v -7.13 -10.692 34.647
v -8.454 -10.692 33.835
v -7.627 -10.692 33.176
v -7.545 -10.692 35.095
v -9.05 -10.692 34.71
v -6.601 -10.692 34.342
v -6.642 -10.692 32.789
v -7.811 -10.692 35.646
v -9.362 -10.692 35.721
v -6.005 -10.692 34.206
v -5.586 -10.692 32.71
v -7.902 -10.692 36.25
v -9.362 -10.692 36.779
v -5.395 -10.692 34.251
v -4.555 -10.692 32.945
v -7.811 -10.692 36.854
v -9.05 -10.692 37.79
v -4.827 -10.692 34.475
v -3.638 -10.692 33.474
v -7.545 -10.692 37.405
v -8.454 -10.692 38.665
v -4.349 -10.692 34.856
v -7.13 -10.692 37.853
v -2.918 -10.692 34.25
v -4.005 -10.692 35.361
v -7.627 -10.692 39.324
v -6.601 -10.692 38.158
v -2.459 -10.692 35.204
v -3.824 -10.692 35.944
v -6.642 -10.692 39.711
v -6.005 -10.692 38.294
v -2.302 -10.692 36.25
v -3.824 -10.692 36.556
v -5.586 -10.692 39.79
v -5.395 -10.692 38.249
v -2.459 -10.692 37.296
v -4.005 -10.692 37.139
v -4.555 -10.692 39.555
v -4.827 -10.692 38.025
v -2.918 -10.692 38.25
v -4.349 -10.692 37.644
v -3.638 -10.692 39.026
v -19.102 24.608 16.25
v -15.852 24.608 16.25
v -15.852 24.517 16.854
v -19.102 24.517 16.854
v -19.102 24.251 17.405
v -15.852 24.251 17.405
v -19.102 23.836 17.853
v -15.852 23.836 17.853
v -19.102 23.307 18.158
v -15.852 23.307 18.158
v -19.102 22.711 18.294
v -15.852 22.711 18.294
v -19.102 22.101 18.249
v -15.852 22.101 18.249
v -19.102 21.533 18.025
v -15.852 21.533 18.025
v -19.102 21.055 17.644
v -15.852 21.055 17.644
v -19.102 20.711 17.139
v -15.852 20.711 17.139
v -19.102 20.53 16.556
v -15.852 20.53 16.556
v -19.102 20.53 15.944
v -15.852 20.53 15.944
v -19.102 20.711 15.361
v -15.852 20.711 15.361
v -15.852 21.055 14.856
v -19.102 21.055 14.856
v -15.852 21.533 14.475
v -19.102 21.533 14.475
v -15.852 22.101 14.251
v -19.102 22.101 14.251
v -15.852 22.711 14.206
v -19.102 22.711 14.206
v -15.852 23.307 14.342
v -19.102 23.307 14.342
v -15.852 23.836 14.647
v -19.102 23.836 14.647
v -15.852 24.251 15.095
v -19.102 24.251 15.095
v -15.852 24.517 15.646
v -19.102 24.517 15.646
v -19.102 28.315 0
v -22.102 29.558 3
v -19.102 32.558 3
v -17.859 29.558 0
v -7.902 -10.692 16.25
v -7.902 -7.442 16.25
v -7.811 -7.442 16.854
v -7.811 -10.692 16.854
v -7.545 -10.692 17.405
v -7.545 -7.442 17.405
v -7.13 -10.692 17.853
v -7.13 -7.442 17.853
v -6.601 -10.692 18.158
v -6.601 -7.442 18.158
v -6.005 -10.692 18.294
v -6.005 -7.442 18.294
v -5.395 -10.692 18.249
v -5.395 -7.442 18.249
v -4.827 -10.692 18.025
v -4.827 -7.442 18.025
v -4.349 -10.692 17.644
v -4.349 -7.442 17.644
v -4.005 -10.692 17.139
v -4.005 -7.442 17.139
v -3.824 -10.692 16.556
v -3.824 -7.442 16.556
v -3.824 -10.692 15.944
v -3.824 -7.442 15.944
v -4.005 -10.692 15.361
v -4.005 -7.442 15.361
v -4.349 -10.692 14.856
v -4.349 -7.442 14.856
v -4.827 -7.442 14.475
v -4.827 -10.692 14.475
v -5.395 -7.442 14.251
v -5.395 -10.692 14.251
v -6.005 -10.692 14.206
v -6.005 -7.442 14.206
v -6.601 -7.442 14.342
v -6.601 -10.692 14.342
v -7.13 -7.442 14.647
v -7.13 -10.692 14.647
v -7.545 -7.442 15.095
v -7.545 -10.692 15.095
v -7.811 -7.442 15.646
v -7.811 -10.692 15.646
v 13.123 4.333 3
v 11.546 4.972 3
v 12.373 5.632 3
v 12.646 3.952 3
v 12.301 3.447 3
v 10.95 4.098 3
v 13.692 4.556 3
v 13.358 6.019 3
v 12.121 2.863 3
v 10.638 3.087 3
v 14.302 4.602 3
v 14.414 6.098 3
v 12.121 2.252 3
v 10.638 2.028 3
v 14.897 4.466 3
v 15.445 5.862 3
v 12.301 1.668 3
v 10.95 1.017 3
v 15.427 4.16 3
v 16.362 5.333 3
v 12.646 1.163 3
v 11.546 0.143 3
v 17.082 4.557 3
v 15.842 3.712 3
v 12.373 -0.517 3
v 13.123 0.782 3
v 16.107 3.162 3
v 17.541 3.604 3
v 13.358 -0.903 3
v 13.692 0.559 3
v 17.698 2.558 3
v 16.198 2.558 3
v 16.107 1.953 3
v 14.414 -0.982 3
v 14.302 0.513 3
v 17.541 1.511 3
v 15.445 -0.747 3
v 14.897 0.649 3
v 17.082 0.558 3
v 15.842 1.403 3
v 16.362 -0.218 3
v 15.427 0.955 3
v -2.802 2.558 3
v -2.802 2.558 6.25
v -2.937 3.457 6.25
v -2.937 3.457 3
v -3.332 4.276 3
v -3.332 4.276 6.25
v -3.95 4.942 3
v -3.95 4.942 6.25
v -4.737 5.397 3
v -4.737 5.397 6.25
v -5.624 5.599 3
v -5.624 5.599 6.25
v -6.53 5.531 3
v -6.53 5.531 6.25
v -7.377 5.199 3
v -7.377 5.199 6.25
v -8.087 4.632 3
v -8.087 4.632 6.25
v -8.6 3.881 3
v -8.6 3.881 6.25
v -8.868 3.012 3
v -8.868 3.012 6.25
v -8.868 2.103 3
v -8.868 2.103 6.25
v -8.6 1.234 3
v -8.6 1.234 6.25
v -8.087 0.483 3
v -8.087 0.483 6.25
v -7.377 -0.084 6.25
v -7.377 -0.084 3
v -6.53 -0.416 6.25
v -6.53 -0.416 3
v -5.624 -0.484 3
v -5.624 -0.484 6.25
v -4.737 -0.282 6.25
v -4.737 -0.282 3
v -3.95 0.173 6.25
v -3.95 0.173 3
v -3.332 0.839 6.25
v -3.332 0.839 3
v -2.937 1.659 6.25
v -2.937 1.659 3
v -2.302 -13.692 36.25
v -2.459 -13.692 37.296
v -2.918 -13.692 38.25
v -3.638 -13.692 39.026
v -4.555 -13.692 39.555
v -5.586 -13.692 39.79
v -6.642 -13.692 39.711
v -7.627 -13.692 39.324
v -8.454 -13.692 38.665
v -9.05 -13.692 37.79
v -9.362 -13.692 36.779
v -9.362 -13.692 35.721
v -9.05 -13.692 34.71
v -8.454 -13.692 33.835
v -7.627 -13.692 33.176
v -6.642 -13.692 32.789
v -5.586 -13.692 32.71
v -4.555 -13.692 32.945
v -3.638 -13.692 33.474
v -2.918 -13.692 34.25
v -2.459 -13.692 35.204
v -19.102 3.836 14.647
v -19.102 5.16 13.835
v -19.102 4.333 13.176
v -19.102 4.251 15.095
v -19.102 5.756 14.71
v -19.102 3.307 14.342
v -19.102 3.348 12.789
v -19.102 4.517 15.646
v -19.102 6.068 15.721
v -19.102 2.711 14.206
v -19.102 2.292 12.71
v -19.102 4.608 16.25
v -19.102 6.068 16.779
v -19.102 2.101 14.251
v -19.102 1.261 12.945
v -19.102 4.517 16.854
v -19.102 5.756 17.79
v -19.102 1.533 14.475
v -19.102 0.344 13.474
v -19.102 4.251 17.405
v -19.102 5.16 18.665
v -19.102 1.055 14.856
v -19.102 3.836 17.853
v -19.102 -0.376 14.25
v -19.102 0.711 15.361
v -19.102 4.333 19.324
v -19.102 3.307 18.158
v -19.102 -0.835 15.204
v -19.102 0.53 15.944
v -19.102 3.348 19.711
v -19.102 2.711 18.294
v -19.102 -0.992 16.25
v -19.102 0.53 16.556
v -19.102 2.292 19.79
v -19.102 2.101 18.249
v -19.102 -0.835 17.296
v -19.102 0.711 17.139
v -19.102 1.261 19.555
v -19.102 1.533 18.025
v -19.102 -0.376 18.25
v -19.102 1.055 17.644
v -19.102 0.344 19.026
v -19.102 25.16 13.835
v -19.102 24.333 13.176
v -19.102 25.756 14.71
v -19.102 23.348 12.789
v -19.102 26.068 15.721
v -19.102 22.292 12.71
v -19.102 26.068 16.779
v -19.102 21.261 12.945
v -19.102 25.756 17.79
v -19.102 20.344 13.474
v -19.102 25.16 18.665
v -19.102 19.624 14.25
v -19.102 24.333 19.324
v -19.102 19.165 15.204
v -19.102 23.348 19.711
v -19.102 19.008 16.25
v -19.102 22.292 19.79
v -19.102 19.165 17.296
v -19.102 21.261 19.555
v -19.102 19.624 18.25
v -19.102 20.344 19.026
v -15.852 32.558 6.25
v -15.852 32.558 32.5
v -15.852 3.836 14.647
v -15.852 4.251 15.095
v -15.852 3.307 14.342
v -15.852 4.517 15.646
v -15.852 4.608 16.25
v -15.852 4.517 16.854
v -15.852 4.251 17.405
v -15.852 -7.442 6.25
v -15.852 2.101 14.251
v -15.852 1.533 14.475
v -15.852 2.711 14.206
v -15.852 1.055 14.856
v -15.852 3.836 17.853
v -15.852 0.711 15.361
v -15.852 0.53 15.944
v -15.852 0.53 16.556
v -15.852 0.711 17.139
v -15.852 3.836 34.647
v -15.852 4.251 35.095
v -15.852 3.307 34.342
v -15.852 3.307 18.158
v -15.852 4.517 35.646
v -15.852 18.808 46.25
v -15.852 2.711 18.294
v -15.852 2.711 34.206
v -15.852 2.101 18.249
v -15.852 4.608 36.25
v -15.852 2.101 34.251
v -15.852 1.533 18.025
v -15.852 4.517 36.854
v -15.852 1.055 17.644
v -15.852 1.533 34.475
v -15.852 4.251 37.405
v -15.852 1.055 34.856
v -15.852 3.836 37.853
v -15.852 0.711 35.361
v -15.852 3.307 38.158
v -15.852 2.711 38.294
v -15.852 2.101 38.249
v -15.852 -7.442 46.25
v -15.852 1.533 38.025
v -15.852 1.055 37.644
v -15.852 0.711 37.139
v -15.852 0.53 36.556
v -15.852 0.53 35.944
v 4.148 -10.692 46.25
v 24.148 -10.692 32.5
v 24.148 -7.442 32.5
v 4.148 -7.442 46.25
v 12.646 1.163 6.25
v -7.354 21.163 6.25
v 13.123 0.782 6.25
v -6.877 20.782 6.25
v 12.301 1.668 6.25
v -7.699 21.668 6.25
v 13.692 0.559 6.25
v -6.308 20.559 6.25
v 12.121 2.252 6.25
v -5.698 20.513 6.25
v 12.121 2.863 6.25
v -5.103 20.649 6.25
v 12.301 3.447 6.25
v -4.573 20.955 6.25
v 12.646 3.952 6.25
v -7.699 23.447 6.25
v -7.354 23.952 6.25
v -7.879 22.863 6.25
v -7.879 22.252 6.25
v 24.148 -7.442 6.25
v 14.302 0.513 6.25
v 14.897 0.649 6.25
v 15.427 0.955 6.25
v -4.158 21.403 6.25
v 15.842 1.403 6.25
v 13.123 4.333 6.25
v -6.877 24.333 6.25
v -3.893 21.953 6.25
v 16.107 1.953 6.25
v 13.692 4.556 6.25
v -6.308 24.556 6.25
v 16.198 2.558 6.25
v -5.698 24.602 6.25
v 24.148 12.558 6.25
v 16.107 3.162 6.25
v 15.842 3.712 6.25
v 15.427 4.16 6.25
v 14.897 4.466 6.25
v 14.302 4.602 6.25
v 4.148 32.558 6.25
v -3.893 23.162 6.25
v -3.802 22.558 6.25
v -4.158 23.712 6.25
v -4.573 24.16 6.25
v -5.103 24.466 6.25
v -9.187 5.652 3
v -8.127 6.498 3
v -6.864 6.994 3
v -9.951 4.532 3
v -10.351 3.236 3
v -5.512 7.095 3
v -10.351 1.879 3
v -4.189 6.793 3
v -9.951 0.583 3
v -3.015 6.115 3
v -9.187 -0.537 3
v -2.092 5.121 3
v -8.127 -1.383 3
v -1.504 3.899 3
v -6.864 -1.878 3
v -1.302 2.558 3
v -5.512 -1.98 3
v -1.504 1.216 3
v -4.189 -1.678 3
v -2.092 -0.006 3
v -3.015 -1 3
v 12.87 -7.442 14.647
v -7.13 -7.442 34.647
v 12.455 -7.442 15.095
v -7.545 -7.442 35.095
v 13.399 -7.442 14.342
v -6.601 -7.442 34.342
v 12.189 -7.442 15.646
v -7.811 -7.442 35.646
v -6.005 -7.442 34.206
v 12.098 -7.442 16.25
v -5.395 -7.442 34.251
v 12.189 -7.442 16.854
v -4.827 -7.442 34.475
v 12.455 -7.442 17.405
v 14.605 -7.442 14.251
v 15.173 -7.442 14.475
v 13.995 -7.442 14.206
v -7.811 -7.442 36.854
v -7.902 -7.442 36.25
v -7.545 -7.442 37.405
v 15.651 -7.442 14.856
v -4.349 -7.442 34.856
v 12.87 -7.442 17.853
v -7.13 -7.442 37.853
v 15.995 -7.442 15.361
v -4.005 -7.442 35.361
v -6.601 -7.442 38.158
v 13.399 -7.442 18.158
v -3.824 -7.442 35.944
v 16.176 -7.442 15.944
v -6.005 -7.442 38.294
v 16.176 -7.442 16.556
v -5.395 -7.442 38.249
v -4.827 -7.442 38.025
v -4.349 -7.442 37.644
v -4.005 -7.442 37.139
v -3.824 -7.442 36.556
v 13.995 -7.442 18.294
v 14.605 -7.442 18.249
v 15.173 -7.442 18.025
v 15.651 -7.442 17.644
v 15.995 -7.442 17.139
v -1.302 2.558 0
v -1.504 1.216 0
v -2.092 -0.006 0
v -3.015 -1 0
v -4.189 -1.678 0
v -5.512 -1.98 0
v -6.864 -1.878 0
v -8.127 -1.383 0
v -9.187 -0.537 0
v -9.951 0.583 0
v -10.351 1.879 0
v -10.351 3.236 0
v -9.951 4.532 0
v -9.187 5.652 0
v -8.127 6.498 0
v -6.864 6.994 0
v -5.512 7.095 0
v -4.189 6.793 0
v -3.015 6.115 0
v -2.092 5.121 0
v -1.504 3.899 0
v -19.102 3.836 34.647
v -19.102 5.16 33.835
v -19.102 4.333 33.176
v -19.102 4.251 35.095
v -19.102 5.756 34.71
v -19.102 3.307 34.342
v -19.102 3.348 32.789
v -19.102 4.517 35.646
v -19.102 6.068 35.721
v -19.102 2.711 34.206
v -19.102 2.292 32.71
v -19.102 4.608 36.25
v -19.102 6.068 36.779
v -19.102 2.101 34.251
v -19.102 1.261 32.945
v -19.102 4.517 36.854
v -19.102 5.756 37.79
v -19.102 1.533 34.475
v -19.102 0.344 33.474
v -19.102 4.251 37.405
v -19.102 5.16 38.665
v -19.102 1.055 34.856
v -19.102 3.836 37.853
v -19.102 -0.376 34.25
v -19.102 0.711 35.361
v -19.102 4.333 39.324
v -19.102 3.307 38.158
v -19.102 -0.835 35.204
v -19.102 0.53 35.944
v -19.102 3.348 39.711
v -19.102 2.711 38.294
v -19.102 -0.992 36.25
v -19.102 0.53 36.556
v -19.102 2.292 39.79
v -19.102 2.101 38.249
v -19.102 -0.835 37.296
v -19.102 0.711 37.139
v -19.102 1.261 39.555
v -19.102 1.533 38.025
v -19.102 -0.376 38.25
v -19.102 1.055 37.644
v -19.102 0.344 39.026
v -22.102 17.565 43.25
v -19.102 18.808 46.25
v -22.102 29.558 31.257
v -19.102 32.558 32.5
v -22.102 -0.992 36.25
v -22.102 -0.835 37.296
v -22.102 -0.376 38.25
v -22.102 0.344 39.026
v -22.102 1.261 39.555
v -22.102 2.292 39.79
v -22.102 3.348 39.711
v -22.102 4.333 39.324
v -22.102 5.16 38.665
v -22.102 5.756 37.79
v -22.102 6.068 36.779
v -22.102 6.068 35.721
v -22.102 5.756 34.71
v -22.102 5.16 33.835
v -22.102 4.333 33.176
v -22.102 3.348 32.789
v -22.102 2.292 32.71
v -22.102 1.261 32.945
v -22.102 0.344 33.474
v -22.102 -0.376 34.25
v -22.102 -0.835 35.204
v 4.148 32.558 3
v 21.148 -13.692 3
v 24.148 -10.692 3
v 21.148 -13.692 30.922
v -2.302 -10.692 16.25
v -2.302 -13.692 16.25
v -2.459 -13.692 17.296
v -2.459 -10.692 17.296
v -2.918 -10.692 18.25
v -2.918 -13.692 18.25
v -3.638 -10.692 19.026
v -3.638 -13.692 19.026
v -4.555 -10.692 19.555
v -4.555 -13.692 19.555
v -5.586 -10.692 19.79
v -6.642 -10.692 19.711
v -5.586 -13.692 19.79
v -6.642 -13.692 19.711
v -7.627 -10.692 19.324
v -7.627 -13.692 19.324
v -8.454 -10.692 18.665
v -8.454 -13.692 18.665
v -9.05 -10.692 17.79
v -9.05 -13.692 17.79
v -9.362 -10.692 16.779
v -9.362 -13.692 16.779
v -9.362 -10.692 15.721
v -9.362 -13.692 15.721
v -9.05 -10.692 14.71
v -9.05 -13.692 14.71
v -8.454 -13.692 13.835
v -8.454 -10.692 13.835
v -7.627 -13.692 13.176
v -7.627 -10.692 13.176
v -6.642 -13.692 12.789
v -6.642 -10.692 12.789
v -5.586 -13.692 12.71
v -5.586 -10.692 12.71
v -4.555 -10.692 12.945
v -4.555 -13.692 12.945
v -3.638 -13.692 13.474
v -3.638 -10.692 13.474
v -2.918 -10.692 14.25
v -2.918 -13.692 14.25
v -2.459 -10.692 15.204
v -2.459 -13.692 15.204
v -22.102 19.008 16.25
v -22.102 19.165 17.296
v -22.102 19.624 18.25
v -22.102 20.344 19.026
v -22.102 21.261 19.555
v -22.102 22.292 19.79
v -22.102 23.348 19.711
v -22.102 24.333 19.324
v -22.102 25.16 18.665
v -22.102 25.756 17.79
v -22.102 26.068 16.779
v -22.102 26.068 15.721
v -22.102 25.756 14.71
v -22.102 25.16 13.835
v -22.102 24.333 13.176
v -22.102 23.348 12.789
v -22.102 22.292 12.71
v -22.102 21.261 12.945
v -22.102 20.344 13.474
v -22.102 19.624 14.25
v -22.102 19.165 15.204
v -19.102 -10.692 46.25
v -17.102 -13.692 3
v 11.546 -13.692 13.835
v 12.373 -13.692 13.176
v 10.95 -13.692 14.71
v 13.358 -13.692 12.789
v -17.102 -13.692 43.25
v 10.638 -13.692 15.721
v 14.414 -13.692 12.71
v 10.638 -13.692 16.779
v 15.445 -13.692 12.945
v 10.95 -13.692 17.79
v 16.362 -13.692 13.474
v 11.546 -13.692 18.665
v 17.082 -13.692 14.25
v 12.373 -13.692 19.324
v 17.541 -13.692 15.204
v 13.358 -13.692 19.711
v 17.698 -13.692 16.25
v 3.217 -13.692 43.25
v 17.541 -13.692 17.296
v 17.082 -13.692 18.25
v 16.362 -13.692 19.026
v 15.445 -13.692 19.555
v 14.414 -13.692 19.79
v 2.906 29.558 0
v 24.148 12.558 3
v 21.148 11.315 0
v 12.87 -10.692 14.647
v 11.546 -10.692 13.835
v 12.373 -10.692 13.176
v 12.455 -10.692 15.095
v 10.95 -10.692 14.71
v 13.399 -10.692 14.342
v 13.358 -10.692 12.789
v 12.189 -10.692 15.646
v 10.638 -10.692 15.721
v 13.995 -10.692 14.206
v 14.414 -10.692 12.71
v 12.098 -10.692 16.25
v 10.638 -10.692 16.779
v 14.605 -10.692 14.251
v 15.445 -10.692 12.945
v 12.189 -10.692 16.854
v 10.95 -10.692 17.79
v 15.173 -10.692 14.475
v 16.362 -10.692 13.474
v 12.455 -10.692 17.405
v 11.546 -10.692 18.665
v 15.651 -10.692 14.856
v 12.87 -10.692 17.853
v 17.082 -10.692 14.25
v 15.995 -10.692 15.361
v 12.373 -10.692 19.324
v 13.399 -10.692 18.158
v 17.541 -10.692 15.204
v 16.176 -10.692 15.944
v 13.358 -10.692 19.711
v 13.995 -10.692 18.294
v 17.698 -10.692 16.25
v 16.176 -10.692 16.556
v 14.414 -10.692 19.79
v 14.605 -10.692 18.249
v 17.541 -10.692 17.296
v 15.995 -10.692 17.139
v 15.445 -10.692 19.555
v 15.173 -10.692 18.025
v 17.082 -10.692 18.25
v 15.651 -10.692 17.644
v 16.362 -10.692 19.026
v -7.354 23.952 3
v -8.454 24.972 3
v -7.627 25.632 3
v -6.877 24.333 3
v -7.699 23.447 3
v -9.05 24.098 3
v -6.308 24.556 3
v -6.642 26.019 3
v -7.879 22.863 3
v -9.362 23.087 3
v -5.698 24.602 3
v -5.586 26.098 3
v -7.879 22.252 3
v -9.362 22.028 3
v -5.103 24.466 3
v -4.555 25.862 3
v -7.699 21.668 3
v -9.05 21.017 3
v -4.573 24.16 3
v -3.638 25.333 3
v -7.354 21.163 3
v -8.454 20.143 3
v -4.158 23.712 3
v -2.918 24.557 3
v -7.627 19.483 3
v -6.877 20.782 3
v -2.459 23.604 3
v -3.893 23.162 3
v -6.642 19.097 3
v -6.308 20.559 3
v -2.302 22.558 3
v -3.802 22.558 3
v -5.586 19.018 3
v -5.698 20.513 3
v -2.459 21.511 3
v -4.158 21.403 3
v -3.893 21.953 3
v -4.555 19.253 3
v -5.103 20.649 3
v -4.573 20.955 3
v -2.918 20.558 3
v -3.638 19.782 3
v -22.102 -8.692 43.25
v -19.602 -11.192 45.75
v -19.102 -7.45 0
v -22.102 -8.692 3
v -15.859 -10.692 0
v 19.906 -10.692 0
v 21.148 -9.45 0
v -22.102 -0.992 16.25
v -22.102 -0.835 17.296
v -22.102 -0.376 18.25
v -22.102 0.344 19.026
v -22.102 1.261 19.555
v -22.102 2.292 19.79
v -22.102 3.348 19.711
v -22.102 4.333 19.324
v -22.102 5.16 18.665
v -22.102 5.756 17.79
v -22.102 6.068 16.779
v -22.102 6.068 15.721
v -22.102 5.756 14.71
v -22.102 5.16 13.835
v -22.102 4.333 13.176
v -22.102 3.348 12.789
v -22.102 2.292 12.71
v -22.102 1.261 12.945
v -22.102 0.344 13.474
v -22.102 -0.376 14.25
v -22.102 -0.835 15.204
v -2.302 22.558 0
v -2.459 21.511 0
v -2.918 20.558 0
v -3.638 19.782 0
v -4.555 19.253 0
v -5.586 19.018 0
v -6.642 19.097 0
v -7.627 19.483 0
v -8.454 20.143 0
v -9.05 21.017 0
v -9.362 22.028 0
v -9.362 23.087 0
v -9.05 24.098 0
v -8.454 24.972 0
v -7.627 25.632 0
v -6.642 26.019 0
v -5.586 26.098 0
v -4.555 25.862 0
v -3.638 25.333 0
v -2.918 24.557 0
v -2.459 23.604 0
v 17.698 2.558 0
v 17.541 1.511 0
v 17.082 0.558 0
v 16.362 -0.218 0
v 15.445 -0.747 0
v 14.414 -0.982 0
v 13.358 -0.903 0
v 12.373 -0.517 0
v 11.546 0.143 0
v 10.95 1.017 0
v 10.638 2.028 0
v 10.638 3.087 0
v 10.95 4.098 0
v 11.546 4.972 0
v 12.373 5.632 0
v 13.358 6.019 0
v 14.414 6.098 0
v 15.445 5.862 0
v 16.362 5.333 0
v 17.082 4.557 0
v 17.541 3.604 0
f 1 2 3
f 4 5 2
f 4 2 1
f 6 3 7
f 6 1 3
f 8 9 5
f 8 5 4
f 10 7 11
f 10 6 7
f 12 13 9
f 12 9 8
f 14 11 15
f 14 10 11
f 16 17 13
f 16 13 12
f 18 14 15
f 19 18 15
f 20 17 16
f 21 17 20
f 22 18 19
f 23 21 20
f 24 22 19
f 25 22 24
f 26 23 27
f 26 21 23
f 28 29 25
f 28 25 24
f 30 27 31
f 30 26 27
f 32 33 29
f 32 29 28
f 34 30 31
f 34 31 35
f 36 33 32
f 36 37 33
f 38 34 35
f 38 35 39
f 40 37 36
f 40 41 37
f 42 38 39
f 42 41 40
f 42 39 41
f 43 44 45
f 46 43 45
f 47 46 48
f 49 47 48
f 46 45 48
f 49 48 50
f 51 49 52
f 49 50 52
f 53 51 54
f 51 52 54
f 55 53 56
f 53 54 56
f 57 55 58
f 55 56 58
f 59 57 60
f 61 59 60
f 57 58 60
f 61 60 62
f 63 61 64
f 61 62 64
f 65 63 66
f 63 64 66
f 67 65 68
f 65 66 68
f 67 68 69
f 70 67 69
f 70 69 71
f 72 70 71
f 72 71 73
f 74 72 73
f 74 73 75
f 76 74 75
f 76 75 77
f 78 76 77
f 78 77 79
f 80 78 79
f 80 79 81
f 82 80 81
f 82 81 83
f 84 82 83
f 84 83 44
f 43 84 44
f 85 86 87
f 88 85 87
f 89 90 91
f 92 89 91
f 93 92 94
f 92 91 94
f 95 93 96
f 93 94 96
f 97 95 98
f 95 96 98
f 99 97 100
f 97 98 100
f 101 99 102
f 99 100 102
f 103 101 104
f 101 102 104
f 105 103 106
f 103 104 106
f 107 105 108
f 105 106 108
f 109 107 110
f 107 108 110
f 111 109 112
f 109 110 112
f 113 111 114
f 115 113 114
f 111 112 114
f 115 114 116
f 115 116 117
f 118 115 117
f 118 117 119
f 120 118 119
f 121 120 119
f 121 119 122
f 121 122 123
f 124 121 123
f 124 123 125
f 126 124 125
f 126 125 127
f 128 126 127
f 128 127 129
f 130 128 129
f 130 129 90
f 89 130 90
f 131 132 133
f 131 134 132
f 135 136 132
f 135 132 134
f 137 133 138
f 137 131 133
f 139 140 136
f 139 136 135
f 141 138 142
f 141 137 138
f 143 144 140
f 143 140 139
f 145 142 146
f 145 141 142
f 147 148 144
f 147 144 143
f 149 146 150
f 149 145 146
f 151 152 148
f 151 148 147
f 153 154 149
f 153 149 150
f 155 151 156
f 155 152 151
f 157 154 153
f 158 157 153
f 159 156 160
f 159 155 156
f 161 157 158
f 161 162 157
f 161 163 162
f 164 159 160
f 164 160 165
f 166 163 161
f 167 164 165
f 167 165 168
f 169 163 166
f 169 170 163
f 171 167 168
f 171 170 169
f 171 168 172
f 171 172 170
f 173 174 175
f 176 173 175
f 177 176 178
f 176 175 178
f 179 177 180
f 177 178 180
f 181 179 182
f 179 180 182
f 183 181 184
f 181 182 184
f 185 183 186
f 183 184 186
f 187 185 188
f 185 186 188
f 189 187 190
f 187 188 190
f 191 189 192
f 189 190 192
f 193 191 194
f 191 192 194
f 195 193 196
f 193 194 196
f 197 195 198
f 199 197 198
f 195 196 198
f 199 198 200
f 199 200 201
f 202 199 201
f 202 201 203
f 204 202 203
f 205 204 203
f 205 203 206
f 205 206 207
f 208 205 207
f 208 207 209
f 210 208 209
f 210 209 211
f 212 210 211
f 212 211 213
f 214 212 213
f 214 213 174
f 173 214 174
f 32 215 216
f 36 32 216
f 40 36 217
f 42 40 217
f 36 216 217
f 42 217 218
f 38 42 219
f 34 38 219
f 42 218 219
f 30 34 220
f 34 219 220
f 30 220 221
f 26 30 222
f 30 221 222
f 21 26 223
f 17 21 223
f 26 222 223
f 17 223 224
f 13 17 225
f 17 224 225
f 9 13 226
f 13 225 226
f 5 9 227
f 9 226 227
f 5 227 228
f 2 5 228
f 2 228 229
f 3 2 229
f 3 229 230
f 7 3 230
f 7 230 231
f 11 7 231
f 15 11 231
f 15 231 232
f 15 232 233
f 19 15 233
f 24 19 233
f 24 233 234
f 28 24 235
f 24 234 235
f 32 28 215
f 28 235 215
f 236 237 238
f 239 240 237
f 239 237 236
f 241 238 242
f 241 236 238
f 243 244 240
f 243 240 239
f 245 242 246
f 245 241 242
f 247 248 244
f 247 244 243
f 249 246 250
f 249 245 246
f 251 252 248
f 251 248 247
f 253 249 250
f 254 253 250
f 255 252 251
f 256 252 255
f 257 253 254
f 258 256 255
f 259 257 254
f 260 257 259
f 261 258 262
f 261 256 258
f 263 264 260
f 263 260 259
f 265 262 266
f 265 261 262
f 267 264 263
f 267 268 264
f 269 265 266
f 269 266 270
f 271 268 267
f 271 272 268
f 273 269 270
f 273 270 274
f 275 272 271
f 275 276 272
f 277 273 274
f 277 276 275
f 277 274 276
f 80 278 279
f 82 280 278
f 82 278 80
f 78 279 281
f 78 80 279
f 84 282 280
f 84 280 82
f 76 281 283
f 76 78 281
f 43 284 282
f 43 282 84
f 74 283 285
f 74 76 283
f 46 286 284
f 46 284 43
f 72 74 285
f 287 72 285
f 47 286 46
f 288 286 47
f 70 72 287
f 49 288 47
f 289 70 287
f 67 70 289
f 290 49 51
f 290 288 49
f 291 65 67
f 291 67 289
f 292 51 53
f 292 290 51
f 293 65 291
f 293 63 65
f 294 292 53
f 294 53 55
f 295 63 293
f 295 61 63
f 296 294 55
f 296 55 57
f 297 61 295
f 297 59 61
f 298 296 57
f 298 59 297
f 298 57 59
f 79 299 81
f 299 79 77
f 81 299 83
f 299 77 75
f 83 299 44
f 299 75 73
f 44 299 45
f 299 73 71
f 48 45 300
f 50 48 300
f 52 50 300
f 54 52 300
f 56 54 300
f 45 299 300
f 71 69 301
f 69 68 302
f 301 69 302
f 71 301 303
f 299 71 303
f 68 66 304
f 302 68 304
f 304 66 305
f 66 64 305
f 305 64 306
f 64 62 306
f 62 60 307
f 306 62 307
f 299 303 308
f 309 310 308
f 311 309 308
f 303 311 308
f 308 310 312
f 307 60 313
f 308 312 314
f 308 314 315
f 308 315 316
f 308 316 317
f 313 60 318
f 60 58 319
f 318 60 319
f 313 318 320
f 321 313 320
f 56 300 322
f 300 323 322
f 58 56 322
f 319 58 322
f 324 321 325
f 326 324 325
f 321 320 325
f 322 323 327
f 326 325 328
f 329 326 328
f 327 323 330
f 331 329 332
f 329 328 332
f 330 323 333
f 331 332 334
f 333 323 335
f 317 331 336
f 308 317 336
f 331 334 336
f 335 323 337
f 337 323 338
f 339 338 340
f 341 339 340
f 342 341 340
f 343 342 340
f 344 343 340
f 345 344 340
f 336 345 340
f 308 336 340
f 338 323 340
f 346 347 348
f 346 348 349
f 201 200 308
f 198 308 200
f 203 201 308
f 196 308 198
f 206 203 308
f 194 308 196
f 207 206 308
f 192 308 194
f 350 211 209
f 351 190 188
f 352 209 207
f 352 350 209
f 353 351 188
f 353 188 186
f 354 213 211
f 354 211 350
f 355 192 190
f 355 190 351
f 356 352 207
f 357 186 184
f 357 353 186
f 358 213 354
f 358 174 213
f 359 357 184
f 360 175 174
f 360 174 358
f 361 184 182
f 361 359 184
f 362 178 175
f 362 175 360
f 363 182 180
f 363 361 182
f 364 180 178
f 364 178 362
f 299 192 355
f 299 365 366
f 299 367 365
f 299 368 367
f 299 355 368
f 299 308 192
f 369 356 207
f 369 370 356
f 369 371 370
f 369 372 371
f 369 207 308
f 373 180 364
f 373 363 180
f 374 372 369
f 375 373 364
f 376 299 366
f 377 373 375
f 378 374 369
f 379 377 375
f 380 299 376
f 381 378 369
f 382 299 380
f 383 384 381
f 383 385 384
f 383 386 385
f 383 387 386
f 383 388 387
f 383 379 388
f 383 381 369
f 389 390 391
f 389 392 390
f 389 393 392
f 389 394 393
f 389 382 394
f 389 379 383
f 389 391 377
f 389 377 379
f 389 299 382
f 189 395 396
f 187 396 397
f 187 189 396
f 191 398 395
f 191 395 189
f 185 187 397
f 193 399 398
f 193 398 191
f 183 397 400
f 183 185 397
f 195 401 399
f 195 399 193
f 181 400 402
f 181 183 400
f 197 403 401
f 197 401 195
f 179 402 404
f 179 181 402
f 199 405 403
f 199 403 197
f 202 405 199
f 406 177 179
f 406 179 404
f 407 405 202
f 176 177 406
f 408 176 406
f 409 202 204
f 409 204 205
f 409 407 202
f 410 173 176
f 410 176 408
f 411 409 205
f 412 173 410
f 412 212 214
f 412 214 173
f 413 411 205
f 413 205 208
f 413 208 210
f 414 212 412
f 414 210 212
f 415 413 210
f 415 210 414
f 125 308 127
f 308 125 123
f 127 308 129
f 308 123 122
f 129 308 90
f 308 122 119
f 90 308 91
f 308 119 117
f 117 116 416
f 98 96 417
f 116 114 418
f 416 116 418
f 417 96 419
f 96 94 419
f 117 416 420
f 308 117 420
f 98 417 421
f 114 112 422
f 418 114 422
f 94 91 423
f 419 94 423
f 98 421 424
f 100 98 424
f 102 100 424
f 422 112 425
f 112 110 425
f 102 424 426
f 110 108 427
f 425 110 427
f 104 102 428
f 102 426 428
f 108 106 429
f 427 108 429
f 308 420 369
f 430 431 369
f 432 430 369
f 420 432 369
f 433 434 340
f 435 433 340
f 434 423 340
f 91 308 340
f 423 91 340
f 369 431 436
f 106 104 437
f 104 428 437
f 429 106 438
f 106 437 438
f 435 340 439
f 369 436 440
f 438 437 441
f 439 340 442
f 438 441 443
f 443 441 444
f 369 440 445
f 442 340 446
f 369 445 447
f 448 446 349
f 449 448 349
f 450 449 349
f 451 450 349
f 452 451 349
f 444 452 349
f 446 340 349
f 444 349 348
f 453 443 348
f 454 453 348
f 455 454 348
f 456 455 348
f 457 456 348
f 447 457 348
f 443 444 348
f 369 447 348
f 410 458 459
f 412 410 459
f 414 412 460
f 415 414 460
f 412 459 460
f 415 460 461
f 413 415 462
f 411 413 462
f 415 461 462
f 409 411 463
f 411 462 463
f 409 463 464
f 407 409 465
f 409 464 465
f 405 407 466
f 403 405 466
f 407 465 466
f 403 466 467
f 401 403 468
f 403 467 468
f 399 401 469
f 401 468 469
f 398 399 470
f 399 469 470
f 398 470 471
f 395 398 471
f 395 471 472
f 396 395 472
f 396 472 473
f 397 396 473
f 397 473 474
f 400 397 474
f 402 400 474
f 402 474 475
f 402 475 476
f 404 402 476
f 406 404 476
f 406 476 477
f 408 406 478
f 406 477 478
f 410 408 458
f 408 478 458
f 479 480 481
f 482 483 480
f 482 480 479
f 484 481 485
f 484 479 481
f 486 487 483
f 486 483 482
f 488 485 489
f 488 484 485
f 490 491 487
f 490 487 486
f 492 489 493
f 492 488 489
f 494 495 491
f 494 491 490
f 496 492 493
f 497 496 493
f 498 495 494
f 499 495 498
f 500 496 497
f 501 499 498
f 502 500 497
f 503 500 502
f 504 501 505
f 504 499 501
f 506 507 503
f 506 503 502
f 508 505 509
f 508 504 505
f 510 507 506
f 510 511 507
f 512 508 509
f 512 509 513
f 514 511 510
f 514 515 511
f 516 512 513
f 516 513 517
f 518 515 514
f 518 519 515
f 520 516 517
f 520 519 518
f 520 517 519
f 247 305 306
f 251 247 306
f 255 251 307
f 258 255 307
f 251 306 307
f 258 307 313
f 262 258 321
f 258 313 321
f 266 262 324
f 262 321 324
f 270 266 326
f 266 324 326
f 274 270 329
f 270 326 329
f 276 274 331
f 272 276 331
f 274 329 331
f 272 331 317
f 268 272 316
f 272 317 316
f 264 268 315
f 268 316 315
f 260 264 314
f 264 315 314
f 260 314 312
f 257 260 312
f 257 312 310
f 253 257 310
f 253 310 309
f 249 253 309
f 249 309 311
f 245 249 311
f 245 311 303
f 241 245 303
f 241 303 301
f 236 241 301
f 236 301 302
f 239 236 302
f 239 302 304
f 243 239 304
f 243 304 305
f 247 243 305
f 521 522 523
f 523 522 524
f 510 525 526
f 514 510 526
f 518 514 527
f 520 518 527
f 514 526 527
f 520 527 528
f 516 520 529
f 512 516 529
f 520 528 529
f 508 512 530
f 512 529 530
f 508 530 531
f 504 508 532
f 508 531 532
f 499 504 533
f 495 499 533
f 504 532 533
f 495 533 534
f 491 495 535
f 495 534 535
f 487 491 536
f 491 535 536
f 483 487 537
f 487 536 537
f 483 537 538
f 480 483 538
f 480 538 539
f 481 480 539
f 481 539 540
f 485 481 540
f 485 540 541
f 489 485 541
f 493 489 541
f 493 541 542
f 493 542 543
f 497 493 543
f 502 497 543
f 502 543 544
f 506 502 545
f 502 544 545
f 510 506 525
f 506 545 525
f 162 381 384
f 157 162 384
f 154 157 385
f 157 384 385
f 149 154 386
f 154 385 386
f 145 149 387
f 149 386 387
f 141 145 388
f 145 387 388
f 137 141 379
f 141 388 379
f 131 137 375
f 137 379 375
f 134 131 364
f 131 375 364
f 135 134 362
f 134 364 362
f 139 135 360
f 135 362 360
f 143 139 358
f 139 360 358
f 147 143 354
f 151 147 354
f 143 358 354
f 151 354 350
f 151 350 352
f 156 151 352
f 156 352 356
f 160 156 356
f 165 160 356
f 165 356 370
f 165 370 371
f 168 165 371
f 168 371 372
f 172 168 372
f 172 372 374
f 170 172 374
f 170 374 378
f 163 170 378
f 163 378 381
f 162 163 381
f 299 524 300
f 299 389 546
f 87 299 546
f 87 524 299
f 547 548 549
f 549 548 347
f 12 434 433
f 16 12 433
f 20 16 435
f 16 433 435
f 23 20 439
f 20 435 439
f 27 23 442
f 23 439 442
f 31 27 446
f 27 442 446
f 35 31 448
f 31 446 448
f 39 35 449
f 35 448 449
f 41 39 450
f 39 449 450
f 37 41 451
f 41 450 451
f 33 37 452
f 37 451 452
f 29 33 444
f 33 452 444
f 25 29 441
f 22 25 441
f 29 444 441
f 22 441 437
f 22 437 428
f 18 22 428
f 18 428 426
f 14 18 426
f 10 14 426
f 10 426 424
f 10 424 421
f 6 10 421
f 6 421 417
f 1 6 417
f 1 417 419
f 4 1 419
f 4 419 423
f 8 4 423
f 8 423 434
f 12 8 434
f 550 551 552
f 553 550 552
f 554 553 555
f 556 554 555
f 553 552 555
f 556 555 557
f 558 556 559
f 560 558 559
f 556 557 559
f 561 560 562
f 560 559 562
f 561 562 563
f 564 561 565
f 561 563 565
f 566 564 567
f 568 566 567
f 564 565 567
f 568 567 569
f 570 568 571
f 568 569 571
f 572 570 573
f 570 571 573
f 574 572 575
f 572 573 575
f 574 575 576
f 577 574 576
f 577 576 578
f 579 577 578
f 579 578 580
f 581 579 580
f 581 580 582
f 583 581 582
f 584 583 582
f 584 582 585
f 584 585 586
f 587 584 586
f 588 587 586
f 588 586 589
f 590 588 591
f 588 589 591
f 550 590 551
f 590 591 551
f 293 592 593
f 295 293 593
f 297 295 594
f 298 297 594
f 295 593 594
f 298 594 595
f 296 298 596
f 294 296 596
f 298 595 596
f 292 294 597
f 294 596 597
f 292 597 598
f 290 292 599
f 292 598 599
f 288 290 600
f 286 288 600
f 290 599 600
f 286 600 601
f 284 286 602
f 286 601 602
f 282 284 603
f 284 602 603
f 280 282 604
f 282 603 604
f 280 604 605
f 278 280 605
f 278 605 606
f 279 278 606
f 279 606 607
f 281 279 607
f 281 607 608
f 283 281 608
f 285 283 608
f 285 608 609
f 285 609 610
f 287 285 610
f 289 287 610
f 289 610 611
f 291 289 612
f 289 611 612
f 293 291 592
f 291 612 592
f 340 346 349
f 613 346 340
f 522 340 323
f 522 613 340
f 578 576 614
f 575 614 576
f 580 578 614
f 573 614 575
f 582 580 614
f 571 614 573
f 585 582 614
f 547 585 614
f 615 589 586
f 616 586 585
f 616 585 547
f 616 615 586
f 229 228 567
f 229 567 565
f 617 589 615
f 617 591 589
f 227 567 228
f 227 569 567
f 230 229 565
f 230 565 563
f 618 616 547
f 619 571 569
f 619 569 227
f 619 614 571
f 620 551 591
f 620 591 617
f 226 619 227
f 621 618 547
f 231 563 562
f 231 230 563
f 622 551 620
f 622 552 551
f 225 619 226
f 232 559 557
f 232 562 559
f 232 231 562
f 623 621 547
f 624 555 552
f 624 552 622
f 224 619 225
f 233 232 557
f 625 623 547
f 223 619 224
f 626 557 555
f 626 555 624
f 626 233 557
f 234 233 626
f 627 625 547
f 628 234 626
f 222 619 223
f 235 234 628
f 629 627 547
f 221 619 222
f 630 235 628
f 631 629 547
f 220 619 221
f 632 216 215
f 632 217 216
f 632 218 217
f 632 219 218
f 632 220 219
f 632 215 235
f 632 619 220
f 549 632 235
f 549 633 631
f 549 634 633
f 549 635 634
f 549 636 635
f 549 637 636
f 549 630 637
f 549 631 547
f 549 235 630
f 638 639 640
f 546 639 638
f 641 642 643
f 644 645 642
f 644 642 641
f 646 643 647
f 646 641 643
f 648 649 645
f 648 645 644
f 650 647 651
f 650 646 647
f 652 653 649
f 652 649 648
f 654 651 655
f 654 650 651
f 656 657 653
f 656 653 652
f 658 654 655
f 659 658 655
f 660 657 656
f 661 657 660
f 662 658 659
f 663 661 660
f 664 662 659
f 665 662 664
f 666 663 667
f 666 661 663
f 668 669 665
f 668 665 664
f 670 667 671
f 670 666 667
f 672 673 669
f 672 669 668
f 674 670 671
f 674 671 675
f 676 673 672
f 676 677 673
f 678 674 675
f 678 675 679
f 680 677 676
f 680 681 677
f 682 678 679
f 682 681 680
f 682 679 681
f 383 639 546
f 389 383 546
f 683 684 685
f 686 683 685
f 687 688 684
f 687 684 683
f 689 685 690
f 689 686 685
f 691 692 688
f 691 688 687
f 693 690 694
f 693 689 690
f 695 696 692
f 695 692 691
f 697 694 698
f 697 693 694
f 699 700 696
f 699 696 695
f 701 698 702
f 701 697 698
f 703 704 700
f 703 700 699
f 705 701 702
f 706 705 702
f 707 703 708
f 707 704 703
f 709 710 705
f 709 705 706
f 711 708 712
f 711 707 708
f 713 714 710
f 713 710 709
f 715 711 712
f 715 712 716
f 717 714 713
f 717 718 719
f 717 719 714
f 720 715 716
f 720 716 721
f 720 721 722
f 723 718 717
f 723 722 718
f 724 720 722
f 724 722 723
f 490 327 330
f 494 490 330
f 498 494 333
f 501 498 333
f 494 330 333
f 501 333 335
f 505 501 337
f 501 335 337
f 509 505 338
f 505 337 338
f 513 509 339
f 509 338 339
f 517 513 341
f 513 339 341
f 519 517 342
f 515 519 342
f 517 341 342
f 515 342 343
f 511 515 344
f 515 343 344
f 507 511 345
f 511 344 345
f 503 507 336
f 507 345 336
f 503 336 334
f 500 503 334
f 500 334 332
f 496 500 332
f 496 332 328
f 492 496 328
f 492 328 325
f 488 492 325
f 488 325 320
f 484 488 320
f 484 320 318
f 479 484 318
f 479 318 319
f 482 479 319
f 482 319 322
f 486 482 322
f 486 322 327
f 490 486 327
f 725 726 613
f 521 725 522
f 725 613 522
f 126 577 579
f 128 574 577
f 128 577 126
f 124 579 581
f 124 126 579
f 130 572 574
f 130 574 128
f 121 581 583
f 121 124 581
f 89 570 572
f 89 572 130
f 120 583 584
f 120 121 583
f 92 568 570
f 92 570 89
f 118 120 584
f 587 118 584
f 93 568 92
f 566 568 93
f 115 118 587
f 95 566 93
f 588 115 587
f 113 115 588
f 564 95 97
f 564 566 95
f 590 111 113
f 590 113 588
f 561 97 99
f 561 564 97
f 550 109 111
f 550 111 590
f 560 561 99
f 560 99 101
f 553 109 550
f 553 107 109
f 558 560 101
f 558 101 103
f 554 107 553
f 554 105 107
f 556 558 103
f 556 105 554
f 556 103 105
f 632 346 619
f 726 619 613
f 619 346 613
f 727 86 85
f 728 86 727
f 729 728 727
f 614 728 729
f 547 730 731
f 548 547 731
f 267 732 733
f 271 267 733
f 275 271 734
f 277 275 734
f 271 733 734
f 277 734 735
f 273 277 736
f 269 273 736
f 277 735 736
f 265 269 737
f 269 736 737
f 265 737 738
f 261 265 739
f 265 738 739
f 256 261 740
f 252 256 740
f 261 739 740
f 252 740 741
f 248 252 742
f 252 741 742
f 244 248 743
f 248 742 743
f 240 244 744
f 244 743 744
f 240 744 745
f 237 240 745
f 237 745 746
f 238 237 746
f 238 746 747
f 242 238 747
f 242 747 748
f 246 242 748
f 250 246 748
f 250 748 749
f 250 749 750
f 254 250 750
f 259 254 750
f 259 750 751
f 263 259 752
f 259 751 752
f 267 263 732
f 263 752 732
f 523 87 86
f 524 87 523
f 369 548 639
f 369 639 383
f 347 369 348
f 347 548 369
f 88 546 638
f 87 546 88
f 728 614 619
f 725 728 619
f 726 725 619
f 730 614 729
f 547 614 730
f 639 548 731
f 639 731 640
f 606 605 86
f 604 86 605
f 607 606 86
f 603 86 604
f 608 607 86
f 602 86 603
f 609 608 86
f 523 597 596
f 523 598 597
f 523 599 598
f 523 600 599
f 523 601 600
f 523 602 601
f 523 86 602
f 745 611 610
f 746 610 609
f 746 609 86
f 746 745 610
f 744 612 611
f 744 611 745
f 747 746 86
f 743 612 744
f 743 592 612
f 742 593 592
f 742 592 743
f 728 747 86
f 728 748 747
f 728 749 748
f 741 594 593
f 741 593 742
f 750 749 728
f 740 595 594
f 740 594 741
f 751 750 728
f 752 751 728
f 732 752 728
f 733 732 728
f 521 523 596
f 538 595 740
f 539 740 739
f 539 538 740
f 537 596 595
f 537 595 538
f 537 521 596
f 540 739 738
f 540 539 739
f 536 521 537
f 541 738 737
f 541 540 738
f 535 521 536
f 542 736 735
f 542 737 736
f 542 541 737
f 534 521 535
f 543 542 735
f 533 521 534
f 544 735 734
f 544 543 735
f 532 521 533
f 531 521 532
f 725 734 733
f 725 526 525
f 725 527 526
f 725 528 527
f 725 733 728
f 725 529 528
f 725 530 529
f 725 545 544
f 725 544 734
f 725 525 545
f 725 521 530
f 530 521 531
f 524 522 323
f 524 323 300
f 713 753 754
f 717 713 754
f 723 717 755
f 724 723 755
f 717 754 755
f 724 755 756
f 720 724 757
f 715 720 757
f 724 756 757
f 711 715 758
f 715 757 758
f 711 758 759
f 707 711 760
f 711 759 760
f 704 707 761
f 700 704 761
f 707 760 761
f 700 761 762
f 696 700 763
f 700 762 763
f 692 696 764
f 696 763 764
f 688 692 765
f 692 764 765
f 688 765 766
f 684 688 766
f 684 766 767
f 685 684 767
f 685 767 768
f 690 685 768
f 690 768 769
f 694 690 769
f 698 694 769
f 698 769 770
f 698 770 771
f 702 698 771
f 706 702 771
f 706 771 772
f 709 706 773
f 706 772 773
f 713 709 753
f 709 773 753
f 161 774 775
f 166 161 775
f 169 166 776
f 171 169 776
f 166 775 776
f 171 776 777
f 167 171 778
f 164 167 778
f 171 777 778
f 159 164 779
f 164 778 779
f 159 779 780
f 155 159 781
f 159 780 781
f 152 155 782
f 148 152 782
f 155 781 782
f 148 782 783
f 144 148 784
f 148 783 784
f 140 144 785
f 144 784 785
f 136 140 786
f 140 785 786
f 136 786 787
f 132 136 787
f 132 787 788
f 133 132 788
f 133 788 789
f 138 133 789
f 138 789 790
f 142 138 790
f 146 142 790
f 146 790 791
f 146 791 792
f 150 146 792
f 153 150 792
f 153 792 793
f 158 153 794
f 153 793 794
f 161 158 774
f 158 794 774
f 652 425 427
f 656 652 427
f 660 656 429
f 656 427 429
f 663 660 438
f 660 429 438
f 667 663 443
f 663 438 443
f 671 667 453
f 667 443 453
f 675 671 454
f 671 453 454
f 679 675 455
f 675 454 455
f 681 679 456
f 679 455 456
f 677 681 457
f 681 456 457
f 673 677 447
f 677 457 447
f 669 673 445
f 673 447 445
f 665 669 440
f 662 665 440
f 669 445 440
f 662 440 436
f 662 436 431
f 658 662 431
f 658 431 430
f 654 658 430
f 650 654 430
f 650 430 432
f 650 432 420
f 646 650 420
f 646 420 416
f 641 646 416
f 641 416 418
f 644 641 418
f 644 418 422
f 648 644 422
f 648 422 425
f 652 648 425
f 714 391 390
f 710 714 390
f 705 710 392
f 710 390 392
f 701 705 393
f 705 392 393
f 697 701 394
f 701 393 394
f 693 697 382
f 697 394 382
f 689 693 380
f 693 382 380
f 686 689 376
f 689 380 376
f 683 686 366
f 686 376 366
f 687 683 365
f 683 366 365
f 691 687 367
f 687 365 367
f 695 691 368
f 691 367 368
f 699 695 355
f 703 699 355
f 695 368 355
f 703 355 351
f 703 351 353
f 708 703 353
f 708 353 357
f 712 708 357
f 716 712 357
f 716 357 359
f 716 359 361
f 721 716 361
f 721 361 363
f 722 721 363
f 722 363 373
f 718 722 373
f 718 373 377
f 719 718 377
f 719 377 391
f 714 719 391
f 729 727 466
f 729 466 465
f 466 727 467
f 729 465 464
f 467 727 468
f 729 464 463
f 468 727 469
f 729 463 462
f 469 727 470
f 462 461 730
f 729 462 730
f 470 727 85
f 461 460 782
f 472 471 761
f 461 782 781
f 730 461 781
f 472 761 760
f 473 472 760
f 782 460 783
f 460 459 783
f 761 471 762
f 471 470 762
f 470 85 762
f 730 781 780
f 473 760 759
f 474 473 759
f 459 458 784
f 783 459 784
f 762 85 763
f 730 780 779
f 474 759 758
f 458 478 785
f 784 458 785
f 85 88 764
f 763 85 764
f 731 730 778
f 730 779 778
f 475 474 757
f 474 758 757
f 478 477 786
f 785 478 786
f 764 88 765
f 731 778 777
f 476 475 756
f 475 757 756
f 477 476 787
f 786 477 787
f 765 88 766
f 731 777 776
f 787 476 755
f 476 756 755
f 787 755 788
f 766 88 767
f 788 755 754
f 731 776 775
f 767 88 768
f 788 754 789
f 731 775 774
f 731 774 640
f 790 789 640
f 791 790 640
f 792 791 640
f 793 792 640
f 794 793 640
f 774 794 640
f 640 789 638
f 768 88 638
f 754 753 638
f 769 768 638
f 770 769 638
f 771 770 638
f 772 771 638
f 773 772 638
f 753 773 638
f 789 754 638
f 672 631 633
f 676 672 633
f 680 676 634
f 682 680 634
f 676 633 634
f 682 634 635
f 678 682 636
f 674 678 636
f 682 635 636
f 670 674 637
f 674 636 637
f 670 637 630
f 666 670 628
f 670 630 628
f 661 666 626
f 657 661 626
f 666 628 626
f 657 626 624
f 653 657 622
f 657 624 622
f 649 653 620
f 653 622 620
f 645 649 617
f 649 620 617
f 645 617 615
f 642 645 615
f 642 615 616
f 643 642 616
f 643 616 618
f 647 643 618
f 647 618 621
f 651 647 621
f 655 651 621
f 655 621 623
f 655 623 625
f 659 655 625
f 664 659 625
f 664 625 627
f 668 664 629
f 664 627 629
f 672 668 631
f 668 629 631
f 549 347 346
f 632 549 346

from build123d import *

# Parameters (mm, degrees)
F1_DEPTH  = 6.25
F3_DEPTH  = 6.25
F5_DEPTH  = 6.25
F6_R      = 2.05
F6_R_2    = 3.05
F7_DEPTH  = 25
F8_R      = 2.05
F9_DEPTH  = 25
F10_R     = 2.05
F11_DEPTH = 25
F13_R     = 3.55
F14_DEPTH = 3
F15_R     = 3.55
F16_DEPTH = 3
F17_R     = 3.55
F17_R_2   = 4.55
F18_DEPTH = 3
F19_SIZE  = 5
F20_SIZE  = 3
F21_SIZE  = 3


with BuildPart() as f1:
    # F0 (on Top) → F1 (new body)
    with BuildSketch(Plane.XY):
        Polygon((4.1484118214, 32.5575917727), (-22.1015881786, 32.5575917727), (-22.1015881786, -13.6924082273), (24.1484118214, -13.6924082273), (24.1484118214, 12.5575917727), align=None)
    extrude(amount=F1_DEPTH)

    # F6 (on face) → F7 (cut)
    with BuildSketch(Plane.XY.offset(6.25)):
        with Locations((-5.8515881786, 22.5575917727)):
            Circle(F6_R)
        with Locations((-5.8515881786, 2.5575917727)):
            Circle(F6_R_2)
        with Locations((14.1484118214, 2.5575917727)):
            Circle(F6_R)
    extrude(amount=-F7_DEPTH, mode=Mode.SUBTRACT)


with BuildPart() as f3:
    # F2 (on face) → F3 (new body)
    with BuildSketch(Plane.XZ.offset(13.6924082273)):
        Polygon((-22.1015881786, 46.25), (-22.1015881786, 6.25), (24.1484118214, 6.25), (24.1484118214, 32.5), (4.1484118214, 46.25), align=None)
    extrude(amount=-F3_DEPTH)

    # F8 (on face) → F9 (cut)
    with BuildSketch(Plane(origin=(0, -7.4424082273, 0), x_dir=(-1, 0, 0), z_dir=(0, 1, 0))):
        with Locations((5.8515881786, 16.25)):
            Circle(F8_R)
        with Locations((-14.1484118214, 16.25)):
            Circle(F8_R)
        with Locations((5.8515881786, 36.25)):
            Circle(F8_R)
    extrude(amount=-F9_DEPTH, mode=Mode.SUBTRACT)


with BuildPart() as f5:
    # F4 (on face) → F5 (new body)
    with BuildSketch(Plane(origin=(-22.1015881786, 0, 0), x_dir=(0, -1, 0), z_dir=(-1, 0, 0))):
        Polygon((-32.5575917727, 6.25), (7.4424082273, 6.25), (7.4424082273, 46.25), (-18.8075917727, 46.25), (-32.5575917727, 32.5), align=None)
    extrude(amount=-F5_DEPTH)

    # F10 (on face) → F11 (cut)
    with BuildSketch(Plane.YZ.offset(-15.8515881786)):
        with Locations((22.5575917727, 16.25)):
            Circle(F10_R)
        with Locations((2.5575917727, 16.25)):
            Circle(F10_R)
        with Locations((2.5575917727, 36.25)):
            Circle(F10_R)
    extrude(amount=-F11_DEPTH, mode=Mode.SUBTRACT)


with BuildPart() as f1_1:
    add(f1.part)

    # F12: union F3, F5
    add(f3.part)
    add(f5.part)

    # F13 (on face) → F14 (cut)
    with BuildSketch(Plane.XZ.offset(13.6924082273)):
        with Locations((-5.8515881786, 36.25)):
            Circle(F13_R)
        with Locations((14.1484118214, 16.25)):
            Circle(F13_R)
        with Locations((-5.8515881786, 16.25)):
            Circle(F13_R)
    extrude(amount=-F14_DEPTH, mode=Mode.SUBTRACT)

    # F15 (on face) → F16 (cut)
    with BuildSketch(Plane(origin=(-22.1015881786, 0, 0), x_dir=(0, -1, 0), z_dir=(-1, 0, 0))):
        with Locations((-2.5575917727, 36.25)):
            Circle(F15_R)
        with Locations((-2.5575917727, 16.25)):
            Circle(F15_R)
        with Locations((-22.5575917727, 16.25)):
            Circle(F15_R)
    extrude(amount=-F16_DEPTH, mode=Mode.SUBTRACT)

    # F17 (on face) → F18 (cut)
    with BuildSketch(Plane(origin=(0, 0, 0), x_dir=(1, 0, 0), z_dir=(0, 0, -1))):
        with Locations((-5.8515881786, -22.5575917727)):
            Circle(F17_R)
        with Locations((-5.8515881786, -2.5575917727)):
            Circle(F17_R_2)
        with Locations((14.1484118214, -2.5575917727)):
            Circle(F17_R)
    extrude(amount=-F18_DEPTH, mode=Mode.SUBTRACT)

    # F19
    f19_edges = [f1_1.edges().sort_by_distance(p)[0] for p in [
        (-22.101588, -13.692408, 23.125),
    ]]
    chamfer(f19_edges, length=F19_SIZE)

    # F20 (call 1 of 2: OpenCascade refuses the feature's edges together)
    f20_edges = [f1_1.edges().sort_by_distance(p)[0] for p in [
        (-6.476588, -13.692408, 46.25),
        (14.148412, -13.692408, 39.375),
        (24.148412, -13.692408, 16.25),
    ]]
    chamfer(f20_edges, length=F20_SIZE)

    # F20#2 (call 2 of 2)
    f20_2_edges = [f1_1.edges().sort_by_distance(p)[0] for p in [
        (-22.101588, 5.057592, 46.25),
        (-22.101588, 25.682592, 39.375),
        (-22.101588, 32.557592, 16.25),
    ]]
    chamfer(f20_2_edges, length=F20_SIZE)

    # F21
    f21_edges = [f1_1.edges().sort_by_distance(p)[0] for p in [
        (22.648412, -12.192408, 0),
        (24.148412, 0.932592, 0),
        (14.148412, 22.557592, 0),
        (-7.476588, 32.557592, 0),
        (-20.601588, 31.057592, 0),
        (-22.101588, 10.432592, 0),
        (-19.601588, -11.192408, 0),
        (2.023412, -13.692408, 0),
    ]]
    chamfer(f21_edges, length=F21_SIZE)


solid = f1_1.part
